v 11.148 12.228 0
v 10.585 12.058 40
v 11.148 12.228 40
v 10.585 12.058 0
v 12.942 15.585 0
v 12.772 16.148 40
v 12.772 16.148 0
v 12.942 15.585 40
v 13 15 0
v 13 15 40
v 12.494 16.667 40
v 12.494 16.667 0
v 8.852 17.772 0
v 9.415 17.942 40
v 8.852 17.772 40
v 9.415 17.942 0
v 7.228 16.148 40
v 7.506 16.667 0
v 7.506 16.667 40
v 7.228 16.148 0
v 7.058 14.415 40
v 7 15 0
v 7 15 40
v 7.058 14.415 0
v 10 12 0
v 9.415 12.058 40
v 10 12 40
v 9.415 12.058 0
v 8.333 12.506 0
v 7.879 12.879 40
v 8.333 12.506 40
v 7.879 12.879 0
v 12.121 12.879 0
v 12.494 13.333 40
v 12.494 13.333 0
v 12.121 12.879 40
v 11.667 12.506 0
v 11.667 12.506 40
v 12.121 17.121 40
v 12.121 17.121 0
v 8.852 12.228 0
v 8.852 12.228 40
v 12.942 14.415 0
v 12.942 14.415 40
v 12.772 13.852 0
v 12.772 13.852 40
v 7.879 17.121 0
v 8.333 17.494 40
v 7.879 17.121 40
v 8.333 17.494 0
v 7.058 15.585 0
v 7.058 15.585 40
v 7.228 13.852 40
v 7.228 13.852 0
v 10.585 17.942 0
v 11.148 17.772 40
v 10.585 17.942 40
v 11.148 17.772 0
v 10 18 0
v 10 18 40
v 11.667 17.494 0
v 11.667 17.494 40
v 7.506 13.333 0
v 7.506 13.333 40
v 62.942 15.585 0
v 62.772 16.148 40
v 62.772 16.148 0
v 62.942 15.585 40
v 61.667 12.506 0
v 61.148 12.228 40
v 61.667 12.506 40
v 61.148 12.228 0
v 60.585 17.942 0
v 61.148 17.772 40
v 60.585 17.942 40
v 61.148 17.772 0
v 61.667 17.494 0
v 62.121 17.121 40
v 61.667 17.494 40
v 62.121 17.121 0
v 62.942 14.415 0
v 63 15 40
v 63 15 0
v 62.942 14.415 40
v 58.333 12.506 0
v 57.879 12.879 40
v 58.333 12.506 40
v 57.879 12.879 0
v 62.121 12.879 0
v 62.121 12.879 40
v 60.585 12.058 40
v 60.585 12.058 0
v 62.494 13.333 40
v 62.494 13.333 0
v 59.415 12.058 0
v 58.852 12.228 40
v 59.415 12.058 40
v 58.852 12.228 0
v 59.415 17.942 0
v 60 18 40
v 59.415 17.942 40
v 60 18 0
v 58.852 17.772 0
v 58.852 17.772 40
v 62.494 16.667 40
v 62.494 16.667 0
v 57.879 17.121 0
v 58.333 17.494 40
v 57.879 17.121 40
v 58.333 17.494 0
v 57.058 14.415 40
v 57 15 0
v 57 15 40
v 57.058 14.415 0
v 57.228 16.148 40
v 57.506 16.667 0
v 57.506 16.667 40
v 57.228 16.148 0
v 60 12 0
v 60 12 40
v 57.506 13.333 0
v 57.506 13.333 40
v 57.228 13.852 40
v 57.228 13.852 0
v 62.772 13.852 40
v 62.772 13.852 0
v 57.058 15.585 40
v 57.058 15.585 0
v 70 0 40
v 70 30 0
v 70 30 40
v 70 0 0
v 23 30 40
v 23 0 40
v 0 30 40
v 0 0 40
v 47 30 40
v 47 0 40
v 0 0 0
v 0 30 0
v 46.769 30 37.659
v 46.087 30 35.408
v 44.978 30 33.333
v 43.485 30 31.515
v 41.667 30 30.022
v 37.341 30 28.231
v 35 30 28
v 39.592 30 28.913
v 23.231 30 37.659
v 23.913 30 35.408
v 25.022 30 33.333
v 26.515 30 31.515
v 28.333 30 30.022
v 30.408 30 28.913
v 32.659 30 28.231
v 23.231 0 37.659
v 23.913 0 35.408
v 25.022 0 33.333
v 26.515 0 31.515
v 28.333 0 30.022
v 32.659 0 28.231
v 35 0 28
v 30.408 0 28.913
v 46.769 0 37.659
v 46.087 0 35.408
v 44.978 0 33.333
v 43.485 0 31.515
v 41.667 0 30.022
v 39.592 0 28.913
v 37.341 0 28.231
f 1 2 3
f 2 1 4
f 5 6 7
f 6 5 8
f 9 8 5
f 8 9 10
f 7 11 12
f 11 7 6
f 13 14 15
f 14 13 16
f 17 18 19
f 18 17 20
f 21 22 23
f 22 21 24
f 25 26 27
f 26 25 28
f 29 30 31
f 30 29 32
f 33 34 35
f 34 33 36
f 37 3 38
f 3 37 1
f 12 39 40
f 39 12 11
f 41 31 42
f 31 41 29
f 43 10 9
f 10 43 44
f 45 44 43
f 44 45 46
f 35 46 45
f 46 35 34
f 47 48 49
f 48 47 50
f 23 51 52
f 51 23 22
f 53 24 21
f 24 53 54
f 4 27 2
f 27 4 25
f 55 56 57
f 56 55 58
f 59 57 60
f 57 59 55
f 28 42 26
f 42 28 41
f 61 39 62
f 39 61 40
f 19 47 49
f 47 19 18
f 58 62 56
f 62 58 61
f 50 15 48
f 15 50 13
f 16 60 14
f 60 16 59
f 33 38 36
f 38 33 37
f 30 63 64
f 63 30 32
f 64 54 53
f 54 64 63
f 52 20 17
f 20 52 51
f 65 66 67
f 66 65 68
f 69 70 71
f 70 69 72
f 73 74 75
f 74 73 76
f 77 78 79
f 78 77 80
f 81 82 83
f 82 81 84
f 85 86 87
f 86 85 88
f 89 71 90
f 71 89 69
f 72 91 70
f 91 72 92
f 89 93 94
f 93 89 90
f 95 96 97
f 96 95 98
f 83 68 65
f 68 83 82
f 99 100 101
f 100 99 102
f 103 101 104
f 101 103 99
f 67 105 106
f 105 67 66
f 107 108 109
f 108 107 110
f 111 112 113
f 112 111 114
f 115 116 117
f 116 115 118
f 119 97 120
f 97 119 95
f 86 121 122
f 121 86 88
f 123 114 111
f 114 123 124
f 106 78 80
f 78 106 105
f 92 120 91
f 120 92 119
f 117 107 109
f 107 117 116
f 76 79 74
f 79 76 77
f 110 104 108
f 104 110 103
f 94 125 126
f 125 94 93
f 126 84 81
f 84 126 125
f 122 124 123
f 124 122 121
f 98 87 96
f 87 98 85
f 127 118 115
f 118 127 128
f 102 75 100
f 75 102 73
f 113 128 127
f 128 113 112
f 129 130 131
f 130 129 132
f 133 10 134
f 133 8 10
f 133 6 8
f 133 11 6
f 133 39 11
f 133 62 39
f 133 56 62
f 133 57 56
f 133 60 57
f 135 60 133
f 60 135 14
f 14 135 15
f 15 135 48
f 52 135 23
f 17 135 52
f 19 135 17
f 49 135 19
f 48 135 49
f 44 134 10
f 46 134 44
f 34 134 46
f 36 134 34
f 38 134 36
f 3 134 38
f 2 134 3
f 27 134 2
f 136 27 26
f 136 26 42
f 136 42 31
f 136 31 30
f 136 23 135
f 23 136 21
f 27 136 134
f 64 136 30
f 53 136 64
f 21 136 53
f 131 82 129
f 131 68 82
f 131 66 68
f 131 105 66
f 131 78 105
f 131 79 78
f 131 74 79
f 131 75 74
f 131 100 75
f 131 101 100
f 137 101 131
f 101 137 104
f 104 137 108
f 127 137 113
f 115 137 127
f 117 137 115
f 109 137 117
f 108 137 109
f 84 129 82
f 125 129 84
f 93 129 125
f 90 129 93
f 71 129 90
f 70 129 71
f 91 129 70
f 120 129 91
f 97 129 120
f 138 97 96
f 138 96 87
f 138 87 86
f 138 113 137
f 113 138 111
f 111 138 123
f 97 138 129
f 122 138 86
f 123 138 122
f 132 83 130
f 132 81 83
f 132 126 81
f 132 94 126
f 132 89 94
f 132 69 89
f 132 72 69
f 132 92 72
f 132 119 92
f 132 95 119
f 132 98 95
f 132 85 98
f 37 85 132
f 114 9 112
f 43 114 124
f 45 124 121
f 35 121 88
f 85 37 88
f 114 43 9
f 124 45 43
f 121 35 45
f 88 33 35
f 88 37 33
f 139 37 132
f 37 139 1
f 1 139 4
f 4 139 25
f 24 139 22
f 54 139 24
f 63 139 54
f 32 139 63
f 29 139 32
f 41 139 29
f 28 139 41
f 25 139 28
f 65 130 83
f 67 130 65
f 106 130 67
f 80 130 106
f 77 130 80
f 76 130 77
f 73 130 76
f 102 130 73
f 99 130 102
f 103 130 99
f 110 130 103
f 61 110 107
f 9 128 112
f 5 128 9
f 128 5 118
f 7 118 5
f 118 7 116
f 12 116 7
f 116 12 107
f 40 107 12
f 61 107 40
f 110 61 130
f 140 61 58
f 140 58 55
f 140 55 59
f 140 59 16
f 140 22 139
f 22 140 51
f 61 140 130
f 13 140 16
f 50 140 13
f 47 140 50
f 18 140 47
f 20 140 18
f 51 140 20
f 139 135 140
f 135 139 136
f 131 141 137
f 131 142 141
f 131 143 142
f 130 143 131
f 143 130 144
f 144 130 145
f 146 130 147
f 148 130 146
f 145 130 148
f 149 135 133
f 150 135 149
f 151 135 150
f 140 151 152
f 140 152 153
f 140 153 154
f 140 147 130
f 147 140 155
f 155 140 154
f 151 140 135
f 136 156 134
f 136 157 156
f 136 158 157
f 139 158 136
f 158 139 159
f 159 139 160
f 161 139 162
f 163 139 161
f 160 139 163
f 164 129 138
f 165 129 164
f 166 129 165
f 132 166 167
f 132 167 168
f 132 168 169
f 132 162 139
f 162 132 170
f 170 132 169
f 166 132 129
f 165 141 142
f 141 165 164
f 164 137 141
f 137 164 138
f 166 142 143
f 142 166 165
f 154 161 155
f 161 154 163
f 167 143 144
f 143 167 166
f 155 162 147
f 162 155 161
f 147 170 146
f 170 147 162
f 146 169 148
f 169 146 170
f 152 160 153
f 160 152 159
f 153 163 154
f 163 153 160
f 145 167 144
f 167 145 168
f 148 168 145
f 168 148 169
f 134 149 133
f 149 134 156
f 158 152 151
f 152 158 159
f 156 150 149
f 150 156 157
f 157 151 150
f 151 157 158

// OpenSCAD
$fn = 32;

// ----------------------------------------------------------------------
// Saddle clamp: plain shaft clamp
// ----------------------------------------------------------------------

// --- parameters (mm) ---
blk_l = 70;               // block length, X
blk_w = 30;               // block width, Y
blk_h = 40;               // block height
clamp_r = 12;             // shaft groove radius
hole_r = 3;               // bolt hole radius
hole_m = 10;              // bolt hole margin from the ends

saw_depth = clamp_r + 3;  // saw kerf depth

difference() {
  cube([blk_l, blk_w, blk_h]);
  translate([blk_l / 2, -1, blk_h])
    rotate([-90, 0, 0])
      cylinder(h = blk_w + 2, r = clamp_r);
  for (sx = [0, 1])
    translate([sx ? blk_l - hole_m : hole_m, blk_w / 2, -1])
      cylinder(r = hole_r, h = blk_h + 2);
}
